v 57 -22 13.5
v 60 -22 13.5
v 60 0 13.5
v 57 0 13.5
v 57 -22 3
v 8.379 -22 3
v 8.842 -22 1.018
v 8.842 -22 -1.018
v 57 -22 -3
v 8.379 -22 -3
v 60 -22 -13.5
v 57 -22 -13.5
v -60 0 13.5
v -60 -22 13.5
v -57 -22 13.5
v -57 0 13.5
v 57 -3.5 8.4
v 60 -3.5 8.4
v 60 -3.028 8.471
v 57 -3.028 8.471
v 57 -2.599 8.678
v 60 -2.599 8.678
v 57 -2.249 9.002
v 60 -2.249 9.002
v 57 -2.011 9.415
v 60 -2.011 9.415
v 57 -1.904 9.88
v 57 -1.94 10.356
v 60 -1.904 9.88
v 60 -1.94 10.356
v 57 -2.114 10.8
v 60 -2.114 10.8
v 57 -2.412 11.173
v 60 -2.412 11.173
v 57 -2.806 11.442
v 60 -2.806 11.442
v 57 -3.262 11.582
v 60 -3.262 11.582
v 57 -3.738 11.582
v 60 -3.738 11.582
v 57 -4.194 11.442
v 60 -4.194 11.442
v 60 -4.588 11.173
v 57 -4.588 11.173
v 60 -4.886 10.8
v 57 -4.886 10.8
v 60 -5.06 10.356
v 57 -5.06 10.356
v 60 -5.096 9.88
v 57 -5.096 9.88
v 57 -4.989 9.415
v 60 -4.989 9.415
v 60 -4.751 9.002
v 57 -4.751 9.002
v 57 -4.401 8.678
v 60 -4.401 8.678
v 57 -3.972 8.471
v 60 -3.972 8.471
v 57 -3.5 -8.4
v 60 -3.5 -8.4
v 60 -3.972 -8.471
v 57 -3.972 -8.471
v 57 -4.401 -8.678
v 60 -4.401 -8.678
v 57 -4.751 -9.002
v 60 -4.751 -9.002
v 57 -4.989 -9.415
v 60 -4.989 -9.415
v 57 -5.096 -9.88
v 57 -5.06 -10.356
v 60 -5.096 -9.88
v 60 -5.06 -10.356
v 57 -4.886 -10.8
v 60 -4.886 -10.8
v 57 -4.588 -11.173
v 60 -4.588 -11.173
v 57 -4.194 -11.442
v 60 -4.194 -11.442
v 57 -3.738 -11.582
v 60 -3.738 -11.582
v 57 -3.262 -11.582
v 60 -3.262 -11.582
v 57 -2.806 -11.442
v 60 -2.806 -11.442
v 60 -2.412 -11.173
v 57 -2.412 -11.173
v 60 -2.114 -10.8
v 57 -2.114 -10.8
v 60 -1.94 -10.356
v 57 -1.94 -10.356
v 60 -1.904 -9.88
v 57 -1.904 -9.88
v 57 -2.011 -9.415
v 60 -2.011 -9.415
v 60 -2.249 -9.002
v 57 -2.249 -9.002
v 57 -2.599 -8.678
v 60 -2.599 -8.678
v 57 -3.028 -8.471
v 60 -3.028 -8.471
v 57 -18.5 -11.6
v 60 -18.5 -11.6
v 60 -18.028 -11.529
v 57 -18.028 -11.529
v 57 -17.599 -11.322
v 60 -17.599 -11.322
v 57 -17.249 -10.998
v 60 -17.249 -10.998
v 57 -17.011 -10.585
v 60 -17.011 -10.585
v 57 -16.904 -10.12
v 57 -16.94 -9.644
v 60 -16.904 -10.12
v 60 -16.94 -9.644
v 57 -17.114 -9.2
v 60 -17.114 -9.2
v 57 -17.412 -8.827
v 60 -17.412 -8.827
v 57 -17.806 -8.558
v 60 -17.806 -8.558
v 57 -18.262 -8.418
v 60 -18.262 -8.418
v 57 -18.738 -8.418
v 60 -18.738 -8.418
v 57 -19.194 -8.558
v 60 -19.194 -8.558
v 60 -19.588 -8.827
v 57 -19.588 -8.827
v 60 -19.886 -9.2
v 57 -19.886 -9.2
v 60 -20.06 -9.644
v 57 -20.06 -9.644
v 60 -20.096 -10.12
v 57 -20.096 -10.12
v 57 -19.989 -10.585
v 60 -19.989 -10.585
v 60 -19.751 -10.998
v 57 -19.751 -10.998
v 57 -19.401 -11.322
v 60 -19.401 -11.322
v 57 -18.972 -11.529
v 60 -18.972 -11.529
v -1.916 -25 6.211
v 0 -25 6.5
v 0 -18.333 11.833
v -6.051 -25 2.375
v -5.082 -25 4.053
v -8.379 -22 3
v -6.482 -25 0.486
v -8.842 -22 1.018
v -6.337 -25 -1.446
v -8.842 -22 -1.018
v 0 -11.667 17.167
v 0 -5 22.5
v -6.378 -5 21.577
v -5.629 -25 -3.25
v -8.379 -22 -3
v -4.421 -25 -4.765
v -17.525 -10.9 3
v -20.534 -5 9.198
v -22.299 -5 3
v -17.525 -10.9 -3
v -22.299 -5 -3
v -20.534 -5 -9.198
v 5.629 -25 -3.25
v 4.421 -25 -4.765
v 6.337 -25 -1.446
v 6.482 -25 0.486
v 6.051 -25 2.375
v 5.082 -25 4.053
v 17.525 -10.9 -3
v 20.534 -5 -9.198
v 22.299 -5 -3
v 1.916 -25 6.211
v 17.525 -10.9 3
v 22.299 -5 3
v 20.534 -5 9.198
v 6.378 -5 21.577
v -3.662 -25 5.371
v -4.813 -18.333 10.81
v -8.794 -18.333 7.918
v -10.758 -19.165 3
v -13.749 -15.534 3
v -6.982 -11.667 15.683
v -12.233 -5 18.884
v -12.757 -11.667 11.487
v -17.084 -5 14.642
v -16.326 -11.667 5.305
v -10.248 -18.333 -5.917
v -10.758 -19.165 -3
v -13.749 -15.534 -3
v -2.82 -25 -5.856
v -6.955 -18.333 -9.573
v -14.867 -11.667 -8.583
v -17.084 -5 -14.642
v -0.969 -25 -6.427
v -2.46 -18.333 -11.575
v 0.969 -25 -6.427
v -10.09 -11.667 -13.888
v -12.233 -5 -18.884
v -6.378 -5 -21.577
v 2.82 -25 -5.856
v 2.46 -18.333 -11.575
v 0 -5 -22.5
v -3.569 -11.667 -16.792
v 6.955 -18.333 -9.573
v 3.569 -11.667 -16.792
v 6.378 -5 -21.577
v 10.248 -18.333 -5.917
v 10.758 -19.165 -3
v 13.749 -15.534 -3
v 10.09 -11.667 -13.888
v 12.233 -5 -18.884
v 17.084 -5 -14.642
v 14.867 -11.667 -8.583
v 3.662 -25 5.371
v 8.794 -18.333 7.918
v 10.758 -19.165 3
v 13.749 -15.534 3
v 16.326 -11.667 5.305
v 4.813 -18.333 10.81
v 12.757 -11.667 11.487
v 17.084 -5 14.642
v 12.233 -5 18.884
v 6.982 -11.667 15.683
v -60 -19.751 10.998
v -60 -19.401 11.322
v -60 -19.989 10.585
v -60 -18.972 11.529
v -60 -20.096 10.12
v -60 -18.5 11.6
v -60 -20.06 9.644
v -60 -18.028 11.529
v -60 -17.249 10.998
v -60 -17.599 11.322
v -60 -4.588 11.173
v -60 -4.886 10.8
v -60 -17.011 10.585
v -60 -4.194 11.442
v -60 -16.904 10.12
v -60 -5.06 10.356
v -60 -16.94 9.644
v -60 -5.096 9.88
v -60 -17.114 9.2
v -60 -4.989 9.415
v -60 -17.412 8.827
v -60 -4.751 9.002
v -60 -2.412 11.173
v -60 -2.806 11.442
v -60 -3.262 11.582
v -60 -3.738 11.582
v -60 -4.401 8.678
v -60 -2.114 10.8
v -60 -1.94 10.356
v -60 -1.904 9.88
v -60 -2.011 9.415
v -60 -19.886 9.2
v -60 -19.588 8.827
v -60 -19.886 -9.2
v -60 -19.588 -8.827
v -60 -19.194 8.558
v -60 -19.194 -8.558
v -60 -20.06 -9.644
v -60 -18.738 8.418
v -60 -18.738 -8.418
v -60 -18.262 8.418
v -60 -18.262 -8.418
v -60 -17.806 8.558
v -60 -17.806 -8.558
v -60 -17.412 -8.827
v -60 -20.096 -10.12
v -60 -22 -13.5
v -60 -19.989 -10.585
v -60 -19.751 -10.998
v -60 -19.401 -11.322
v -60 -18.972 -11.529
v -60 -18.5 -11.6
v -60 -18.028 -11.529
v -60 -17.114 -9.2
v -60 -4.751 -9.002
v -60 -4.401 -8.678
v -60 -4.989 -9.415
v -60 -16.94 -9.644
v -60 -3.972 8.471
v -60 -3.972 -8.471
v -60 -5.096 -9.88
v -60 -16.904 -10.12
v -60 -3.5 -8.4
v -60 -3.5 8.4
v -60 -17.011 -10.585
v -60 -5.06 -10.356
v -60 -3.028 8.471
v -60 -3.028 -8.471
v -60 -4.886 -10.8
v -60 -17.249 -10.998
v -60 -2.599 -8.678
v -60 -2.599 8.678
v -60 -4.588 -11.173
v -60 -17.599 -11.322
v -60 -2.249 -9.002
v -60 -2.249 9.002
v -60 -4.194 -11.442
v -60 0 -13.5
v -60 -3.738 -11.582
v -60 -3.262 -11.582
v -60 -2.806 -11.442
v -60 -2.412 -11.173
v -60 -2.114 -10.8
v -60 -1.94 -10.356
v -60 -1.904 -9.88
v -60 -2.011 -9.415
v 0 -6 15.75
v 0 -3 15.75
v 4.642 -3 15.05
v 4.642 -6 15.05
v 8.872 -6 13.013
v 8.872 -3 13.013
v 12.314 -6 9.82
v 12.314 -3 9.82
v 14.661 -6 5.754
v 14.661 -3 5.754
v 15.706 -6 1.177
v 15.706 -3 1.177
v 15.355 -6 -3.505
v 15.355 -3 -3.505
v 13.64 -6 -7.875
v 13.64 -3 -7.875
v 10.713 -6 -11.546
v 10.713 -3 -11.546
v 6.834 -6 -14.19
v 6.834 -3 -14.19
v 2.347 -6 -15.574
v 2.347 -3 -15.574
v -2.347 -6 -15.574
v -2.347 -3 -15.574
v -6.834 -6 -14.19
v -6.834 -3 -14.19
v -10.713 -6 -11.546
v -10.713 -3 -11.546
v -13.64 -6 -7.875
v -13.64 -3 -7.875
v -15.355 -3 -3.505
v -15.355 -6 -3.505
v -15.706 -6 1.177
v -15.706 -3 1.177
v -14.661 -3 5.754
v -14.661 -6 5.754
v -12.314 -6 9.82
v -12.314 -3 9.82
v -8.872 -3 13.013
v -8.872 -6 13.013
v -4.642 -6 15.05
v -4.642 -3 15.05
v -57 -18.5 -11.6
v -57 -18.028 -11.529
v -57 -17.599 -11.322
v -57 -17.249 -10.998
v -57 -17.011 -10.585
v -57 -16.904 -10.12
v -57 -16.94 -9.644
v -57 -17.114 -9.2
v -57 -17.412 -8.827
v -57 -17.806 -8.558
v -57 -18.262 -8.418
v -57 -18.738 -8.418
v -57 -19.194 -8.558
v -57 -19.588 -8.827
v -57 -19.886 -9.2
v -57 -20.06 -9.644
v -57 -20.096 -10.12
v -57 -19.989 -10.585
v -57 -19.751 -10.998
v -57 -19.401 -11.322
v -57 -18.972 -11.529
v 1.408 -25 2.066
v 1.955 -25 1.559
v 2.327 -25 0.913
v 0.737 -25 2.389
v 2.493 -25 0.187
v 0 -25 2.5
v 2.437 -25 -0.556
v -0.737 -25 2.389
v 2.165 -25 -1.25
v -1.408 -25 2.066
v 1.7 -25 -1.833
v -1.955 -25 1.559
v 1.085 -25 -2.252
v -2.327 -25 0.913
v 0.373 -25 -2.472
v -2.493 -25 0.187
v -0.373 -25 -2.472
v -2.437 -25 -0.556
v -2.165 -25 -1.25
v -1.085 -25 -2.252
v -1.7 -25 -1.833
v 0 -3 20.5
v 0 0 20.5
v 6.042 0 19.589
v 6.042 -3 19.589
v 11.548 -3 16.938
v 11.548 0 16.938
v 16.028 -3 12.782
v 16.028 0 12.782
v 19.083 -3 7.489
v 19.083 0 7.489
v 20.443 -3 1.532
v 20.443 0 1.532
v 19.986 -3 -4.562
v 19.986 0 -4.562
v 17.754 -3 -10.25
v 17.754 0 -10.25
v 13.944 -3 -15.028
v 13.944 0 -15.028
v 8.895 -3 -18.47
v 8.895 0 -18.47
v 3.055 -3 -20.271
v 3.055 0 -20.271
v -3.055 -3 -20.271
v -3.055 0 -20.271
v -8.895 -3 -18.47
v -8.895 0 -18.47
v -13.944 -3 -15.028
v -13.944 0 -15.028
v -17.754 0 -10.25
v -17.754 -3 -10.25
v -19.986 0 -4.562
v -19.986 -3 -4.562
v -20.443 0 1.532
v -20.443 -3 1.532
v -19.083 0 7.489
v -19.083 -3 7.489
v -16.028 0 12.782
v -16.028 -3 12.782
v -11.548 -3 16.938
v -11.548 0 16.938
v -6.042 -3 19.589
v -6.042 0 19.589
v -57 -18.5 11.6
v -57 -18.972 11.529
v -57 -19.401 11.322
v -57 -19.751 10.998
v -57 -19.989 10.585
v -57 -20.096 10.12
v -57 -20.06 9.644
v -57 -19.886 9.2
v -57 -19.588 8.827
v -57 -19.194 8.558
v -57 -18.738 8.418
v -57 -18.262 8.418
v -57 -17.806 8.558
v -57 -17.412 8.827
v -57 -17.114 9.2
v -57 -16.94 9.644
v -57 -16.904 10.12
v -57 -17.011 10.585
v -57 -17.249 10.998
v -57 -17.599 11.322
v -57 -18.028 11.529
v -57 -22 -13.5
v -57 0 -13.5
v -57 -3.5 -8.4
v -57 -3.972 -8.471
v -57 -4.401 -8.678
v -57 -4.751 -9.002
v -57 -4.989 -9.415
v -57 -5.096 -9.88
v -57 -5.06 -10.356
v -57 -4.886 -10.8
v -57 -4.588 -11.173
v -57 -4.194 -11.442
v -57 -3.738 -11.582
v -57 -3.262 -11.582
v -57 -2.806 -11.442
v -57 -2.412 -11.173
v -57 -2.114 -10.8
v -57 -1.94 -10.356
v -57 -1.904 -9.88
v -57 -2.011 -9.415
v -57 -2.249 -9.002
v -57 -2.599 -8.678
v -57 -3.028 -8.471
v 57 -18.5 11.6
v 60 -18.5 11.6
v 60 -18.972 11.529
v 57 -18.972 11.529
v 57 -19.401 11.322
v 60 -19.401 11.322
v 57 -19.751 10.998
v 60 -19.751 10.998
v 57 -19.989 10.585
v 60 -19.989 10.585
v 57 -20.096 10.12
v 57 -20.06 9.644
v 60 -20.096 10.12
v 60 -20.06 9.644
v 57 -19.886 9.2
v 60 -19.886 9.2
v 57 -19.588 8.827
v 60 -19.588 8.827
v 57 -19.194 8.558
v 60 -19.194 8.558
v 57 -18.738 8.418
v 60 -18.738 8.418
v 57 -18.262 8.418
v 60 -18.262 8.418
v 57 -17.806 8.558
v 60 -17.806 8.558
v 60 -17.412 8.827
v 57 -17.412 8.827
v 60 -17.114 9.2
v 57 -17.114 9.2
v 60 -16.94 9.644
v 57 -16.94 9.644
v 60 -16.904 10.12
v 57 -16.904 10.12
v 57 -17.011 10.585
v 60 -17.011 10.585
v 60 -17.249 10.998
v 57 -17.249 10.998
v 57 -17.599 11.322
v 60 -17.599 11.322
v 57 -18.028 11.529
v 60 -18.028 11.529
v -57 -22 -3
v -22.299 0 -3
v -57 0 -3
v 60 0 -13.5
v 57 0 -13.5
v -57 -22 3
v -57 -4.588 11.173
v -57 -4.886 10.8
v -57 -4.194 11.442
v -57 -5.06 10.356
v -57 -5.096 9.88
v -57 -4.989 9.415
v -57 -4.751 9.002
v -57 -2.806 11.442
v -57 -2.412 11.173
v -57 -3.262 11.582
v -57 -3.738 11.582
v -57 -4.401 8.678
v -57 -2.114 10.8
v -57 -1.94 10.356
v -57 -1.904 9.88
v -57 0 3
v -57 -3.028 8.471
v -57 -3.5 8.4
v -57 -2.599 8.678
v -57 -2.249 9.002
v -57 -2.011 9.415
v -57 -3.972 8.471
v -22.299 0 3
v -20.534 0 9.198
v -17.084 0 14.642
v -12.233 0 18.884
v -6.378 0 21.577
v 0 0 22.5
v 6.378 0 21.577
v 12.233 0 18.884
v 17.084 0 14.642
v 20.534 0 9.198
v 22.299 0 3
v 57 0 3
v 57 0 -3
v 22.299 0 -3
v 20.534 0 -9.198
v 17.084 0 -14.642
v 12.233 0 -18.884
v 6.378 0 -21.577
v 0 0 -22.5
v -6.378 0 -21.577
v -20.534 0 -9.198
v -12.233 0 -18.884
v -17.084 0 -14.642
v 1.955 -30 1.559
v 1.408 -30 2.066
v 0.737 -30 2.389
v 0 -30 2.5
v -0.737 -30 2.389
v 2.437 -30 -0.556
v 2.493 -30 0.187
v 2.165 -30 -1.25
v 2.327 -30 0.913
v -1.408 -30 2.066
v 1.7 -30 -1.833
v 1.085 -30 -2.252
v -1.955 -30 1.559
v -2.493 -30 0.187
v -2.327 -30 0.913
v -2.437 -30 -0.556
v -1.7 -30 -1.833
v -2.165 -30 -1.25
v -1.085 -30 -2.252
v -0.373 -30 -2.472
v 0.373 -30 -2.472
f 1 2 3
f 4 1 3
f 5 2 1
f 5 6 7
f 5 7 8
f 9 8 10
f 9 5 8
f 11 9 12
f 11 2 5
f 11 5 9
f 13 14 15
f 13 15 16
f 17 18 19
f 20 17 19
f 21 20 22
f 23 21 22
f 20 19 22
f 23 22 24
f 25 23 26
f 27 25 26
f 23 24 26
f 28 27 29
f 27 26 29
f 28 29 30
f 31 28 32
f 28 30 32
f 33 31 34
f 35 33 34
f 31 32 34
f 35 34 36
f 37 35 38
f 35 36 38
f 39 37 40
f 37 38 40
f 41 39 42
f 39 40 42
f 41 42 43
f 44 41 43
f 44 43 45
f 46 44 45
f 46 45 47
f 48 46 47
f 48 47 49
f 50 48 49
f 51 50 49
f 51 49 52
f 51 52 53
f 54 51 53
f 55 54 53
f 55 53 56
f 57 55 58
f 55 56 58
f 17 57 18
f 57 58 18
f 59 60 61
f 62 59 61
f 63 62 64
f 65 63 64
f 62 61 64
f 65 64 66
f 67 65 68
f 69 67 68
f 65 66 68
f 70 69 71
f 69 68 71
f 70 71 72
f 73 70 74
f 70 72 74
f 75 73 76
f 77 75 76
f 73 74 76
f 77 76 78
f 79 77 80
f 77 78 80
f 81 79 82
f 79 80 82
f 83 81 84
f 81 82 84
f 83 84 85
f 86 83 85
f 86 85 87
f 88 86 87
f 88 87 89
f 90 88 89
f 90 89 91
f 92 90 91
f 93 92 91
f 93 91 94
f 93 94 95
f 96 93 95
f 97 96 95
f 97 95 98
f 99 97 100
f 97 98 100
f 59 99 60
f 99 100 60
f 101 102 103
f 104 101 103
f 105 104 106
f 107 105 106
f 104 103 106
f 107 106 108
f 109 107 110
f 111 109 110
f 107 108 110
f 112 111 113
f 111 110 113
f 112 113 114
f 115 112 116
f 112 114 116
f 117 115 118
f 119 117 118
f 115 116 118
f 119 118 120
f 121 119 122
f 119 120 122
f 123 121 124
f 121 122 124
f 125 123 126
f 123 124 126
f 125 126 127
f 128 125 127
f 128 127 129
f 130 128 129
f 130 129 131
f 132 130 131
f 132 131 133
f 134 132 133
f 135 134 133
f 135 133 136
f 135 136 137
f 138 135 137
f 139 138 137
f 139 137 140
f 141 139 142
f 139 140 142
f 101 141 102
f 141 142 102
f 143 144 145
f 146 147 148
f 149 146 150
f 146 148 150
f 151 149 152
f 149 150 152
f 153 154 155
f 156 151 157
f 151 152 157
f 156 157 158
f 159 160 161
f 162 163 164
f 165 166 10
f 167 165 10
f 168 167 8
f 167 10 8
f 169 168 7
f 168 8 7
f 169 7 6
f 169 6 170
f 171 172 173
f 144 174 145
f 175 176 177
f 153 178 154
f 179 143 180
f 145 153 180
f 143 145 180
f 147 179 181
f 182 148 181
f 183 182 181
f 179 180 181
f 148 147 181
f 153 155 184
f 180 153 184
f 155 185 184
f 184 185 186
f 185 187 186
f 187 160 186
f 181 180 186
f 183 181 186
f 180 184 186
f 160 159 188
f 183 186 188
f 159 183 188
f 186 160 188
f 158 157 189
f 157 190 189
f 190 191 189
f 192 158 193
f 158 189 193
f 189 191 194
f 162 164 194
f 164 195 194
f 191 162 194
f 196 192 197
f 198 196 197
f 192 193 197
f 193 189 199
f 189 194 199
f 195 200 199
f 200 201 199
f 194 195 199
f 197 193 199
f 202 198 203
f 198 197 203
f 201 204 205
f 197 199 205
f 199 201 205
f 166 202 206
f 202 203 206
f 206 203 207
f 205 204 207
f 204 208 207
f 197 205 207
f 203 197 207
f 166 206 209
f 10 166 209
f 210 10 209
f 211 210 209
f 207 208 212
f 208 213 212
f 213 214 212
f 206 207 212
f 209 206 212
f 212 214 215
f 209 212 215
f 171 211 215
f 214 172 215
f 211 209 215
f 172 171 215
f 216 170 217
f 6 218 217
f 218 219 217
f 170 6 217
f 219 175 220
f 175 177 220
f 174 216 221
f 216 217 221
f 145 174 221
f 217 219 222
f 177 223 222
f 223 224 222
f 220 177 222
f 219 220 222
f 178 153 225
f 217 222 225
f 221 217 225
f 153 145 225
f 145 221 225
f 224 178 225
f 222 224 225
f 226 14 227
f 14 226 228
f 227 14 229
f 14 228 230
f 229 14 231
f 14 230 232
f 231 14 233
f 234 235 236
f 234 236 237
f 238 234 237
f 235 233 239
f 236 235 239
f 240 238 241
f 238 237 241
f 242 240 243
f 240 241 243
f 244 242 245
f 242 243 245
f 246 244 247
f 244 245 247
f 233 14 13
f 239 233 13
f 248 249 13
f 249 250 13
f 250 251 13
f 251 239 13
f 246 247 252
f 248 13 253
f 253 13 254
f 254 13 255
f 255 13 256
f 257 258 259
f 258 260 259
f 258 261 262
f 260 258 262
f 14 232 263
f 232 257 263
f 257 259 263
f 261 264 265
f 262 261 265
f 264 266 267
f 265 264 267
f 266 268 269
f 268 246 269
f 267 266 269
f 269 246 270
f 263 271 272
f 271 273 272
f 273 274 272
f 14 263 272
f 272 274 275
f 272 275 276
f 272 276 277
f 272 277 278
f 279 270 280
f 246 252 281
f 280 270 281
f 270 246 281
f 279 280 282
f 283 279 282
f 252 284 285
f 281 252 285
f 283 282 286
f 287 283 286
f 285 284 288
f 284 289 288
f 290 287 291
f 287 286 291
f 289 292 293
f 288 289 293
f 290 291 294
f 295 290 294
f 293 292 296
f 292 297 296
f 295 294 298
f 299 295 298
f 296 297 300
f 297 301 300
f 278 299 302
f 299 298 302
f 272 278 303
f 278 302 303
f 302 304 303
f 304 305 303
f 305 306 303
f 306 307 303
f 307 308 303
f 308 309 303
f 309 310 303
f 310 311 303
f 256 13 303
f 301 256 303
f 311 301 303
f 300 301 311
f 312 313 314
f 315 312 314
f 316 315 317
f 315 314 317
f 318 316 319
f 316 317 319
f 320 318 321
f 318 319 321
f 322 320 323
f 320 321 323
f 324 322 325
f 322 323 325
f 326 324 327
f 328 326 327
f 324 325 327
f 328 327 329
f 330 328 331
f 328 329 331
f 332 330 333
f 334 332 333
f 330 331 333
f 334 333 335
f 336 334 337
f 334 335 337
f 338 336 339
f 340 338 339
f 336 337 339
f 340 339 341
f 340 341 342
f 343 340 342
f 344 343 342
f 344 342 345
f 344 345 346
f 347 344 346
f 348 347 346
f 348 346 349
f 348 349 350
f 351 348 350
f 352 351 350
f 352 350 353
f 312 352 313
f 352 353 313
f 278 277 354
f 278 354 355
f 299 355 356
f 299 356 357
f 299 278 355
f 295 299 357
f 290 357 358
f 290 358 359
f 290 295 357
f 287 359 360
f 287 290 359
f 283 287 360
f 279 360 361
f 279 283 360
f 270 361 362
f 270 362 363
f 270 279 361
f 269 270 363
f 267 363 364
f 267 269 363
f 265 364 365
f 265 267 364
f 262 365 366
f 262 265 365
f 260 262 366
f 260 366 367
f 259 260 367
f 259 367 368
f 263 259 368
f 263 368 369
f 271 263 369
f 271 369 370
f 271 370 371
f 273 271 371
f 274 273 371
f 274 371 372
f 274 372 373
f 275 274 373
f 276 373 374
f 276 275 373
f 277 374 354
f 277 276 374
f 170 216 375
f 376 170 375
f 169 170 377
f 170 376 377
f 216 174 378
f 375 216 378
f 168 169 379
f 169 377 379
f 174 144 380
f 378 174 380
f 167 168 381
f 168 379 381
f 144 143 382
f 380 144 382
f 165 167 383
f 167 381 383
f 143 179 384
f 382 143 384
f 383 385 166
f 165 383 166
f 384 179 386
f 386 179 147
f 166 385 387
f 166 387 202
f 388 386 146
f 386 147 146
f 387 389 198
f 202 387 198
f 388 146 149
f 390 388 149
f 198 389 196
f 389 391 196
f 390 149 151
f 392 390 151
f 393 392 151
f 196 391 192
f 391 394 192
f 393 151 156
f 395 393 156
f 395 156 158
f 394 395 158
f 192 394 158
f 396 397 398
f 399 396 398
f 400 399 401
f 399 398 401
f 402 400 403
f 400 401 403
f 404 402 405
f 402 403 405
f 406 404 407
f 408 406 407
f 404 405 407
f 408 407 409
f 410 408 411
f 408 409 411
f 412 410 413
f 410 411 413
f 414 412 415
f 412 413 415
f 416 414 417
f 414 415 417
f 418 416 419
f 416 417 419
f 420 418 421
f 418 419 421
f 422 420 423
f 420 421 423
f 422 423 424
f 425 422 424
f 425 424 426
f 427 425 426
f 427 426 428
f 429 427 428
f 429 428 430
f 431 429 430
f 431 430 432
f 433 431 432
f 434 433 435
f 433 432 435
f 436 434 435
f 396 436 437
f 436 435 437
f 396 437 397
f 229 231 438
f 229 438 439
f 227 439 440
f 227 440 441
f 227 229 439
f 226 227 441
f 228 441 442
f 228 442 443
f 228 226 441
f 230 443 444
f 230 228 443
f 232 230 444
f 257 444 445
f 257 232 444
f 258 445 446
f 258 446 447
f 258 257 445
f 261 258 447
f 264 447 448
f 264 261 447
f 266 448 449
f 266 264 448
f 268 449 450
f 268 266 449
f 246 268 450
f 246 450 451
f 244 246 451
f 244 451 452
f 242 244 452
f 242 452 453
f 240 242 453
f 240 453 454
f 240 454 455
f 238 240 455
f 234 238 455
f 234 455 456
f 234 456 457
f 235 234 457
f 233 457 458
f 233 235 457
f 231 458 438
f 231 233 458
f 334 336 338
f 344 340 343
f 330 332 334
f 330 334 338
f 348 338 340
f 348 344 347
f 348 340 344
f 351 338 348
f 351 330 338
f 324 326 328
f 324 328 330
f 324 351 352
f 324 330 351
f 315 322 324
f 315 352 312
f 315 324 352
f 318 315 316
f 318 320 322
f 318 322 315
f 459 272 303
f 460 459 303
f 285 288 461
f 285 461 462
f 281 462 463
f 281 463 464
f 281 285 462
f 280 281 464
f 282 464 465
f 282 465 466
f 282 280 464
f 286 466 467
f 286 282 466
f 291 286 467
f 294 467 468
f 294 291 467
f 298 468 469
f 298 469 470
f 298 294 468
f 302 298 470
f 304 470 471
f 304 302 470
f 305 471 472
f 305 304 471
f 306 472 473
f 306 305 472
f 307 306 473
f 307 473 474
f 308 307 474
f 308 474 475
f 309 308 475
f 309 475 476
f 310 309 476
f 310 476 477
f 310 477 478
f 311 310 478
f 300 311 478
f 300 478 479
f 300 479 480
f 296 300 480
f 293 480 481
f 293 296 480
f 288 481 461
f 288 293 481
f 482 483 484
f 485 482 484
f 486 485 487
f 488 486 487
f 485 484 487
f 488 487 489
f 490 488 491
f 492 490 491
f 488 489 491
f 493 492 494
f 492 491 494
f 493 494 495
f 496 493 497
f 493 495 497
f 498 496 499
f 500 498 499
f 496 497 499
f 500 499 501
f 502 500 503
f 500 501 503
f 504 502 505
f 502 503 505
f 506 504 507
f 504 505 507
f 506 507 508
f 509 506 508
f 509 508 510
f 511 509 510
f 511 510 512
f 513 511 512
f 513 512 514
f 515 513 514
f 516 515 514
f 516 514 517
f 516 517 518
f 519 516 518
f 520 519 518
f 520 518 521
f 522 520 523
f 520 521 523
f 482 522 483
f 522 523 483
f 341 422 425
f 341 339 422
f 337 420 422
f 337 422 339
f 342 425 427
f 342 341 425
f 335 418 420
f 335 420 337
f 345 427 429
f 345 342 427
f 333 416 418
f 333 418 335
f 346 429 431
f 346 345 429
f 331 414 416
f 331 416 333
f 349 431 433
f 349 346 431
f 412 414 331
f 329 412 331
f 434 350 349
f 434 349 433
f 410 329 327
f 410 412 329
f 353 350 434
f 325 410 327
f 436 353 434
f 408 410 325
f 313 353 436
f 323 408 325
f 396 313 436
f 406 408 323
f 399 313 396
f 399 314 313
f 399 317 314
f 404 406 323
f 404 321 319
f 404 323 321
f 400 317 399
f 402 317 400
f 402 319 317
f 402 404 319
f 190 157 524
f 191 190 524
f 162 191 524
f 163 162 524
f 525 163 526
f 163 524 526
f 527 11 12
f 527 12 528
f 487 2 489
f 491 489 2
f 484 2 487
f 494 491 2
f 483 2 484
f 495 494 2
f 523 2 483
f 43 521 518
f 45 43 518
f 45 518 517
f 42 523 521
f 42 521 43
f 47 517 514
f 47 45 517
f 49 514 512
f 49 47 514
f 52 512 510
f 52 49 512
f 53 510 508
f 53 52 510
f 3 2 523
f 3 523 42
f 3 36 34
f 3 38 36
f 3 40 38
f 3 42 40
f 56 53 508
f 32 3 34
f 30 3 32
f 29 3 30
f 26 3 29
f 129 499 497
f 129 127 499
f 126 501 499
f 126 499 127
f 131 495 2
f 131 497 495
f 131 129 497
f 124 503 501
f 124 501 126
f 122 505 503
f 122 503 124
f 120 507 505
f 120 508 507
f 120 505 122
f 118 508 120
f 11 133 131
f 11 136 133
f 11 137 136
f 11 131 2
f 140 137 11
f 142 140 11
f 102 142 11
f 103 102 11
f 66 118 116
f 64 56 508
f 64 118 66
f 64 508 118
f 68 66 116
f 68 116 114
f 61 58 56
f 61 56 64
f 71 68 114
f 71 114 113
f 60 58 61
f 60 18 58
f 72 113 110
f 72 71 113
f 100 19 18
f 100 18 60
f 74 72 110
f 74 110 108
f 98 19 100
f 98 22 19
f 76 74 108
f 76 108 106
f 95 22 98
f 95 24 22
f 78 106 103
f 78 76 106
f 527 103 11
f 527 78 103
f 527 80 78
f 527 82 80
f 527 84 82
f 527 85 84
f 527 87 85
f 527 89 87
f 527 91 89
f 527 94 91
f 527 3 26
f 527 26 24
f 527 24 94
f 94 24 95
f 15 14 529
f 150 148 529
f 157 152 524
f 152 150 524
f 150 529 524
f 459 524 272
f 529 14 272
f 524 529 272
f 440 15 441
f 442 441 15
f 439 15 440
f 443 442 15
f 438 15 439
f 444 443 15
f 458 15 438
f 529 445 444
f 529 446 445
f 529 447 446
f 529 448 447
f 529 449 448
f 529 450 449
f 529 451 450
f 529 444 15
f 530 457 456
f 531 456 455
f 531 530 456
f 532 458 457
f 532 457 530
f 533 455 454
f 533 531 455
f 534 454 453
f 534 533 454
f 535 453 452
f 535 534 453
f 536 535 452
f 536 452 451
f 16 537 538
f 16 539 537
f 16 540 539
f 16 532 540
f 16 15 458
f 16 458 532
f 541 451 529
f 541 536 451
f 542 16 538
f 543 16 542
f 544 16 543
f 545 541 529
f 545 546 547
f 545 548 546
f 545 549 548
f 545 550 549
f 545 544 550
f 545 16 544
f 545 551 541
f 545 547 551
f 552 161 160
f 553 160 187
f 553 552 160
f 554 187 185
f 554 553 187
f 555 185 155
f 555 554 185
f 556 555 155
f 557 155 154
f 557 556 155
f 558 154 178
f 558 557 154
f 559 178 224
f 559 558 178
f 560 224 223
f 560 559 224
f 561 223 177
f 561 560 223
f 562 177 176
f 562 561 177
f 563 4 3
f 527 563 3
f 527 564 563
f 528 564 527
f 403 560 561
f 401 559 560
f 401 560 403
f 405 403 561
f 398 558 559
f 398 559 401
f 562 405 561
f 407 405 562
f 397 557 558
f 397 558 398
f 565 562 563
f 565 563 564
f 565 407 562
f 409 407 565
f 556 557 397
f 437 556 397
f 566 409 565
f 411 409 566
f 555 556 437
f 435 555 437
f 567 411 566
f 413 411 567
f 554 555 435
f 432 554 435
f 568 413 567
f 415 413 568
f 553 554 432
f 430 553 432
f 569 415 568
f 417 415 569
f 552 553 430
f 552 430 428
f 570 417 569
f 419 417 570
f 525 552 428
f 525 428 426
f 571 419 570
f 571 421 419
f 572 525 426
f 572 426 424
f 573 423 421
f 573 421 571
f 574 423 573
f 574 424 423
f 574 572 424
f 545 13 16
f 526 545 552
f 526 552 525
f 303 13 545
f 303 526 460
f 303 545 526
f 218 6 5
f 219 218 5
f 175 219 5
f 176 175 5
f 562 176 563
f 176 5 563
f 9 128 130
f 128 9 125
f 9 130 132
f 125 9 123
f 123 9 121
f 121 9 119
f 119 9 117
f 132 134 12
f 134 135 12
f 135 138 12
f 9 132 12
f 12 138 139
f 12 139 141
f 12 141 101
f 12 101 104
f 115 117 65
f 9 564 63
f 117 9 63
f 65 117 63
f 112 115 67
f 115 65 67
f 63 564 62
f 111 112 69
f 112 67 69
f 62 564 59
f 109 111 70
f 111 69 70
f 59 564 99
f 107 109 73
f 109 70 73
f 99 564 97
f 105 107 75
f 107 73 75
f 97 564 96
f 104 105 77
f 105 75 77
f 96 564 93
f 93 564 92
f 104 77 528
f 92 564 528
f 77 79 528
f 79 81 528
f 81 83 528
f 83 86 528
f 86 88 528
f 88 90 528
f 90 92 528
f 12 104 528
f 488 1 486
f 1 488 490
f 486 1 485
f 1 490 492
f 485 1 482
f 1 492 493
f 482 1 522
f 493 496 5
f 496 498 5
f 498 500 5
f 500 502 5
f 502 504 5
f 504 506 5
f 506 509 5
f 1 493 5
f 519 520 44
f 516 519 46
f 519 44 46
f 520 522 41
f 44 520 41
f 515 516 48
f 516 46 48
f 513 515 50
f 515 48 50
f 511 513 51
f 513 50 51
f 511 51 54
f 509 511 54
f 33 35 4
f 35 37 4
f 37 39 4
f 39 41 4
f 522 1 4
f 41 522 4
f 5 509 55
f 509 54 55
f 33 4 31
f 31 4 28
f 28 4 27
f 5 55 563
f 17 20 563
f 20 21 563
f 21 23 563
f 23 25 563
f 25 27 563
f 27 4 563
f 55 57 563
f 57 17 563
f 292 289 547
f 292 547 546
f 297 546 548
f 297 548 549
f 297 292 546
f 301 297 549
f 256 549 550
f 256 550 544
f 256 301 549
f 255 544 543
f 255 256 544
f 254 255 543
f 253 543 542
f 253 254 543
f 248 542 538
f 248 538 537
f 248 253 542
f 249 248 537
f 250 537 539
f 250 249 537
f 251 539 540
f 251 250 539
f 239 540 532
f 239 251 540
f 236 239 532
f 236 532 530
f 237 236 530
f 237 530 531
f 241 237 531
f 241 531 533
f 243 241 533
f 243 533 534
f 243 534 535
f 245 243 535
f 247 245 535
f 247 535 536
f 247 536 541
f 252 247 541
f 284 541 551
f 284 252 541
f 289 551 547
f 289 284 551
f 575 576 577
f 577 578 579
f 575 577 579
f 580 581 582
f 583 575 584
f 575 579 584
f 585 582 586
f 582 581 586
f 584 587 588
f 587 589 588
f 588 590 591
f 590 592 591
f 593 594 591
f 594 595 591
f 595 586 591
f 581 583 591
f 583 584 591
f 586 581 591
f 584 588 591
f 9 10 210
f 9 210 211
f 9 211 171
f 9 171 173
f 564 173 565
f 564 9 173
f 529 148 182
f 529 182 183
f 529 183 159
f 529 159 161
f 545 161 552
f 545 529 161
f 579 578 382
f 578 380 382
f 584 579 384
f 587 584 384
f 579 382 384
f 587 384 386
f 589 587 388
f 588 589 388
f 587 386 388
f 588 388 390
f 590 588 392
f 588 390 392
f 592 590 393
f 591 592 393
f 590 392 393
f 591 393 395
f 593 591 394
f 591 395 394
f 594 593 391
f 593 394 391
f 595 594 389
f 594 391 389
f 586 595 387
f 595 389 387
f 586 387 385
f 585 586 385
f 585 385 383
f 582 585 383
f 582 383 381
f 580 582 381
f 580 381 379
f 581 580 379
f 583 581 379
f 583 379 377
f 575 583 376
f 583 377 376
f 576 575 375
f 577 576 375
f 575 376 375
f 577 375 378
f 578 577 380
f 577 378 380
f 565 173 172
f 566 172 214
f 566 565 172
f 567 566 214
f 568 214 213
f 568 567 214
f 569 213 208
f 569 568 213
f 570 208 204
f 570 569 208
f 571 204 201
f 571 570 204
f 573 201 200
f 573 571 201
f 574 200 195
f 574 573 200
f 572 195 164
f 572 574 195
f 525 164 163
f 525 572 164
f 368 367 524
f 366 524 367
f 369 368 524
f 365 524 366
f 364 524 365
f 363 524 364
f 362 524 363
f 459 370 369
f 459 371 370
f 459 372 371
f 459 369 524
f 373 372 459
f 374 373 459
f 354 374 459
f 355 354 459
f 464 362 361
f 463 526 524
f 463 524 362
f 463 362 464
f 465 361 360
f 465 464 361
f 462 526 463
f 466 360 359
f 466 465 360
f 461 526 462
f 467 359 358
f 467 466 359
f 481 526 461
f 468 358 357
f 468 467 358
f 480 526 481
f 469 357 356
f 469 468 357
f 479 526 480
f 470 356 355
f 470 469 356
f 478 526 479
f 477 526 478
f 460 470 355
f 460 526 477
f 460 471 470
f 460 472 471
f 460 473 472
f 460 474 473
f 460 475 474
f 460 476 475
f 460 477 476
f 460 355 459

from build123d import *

# Parameters (mm, degrees)
SKETCH1_R    = 22.5
BASE_DEPTH   = 50
SKETCH3_R    = 20.5
INSET_DEPTH  = 3
SKETCH11_R   = 15.75
INSET2_DEPTH = 3
PAD_START    = 60
SKETCH4_W    = 27
SKETCH4_H    = 22
SKETCH4_R    = 1.6
PAD_DEPTH    = 3
RIB_REACH    = 89.901
SKETCH5_W    = 6
SKETCH5_H    = 22
PAD2_START   = -60
SKETCH4_2_W  = 27
SKETCH4_2_H  = 22
SKETCH4_2_R  = 1.6
PAD2_DEPTH   = 3
RIB2_REACH   = 124.863
SKETCH8_W    = 6
SKETCH8_H    = 22


with BuildPart() as part:
    # Sketch1 → Base (new body)
    with BuildSketch(Plane(origin=(0, 0, 0), x_dir=(1, 0, 0), z_dir=(0, 1, 0))):
        Circle(SKETCH1_R)
    extrude(amount=-BASE_DEPTH)

    # Sketch2 → Cone (revolve, cut)
    with BuildSketch(Plane(origin=(0, 0, 0), x_dir=(0, 0, -1), z_dir=(1, 0, 0))):
        Polygon((33.595146004, -5), (33.595146004, -56.971439611), (0, -56.971439611), (0, -30), (2.5, -30), (2.5, -25), (6.5, -25), (22.5, -5), align=None)
    revolve(axis=Axis((0, 0, 0), (0, -1, 0)), mode=Mode.SUBTRACT)

    # Sketch3 → Inset (cut)
    with BuildSketch(Plane(origin=(0, 0, 0), x_dir=(1, 0, 0), z_dir=(0, 1, 0))):
        Circle(SKETCH3_R)
    extrude(amount=-INSET_DEPTH, mode=Mode.SUBTRACT)

    # Sketch11 → Inset2 (cut)
    with BuildSketch(Plane(origin=(0, -3, 0), x_dir=(1, 0, 0), z_dir=(0, 1, 0))):
        Circle(SKETCH11_R)
    extrude(amount=-INSET2_DEPTH, mode=Mode.SUBTRACT)

    # Sketch5 → Rib (add, up to next)
    with BuildSketch(Plane.ZY.offset(-57), mode=Mode.PRIVATE) as rib_sk1:
        with Locations((0, -11)):
            Rectangle(SKETCH5_W, SKETCH5_H)
    rib_tool1 = extrude(rib_sk1.sketch, amount=RIB_REACH, mode=Mode.PRIVATE) - part.part


with BuildPart() as body_2:
    # Sketch4 → Pad (new body)
    with BuildSketch(Plane(origin=(0, 0, 0), x_dir=(0, 0, -1), z_dir=(1, 0, 0)).offset(PAD_START)):
        with Locations((0, -11)):
            Rectangle(SKETCH4_W, SKETCH4_H)
        with Locations((-10, -3.5)):
            Circle(SKETCH4_R, mode=Mode.SUBTRACT)
        with Locations((-10, -18.5)):
            Circle(SKETCH4_R, mode=Mode.SUBTRACT)
        with Locations((10, -18.5)):
            Circle(SKETCH4_R, mode=Mode.SUBTRACT)
        with Locations((10, -3.5)):
            Circle(SKETCH4_R, mode=Mode.SUBTRACT)
    extrude(amount=-PAD_DEPTH)


with BuildPart() as part_1:
    add(part.part)

    add(body_2.part)  # Rib merges body 2
    add(rib_tool1.solids().sort_by_distance((57, -11, 0))[0])

    # Sketch8 → Rib2 (add, up to next)
    with BuildSketch(Plane(origin=(-57, 0, 0), x_dir=(0, 0, -1), z_dir=(1, 0, 0)), mode=Mode.PRIVATE) as rib2_sk1:
        with Locations((0, -11)):
            Rectangle(SKETCH8_W, SKETCH8_H)
    rib2_tool1 = extrude(rib2_sk1.sketch, amount=RIB2_REACH, mode=Mode.PRIVATE) - part_1.part


with BuildPart() as body_2_2:
    # Sketch4<2> → Pad2 (new body)
    with BuildSketch(Plane(origin=(0, 0, 0), x_dir=(0, 0, -1), z_dir=(1, 0, 0)).offset(PAD2_START)):
        with Locations((0, -11)):
            Rectangle(SKETCH4_2_W, SKETCH4_2_H)
        with Locations((-10, -3.5)):
            Circle(SKETCH4_2_R, mode=Mode.SUBTRACT)
        with Locations((-10, -18.5)):
            Circle(SKETCH4_2_R, mode=Mode.SUBTRACT)
        with Locations((10, -18.5)):
            Circle(SKETCH4_2_R, mode=Mode.SUBTRACT)
        with Locations((10, -3.5)):
            Circle(SKETCH4_2_R, mode=Mode.SUBTRACT)
    extrude(amount=PAD2_DEPTH)


with BuildPart() as part_2:
    add(part_1.part)

    add(body_2_2.part)  # Rib2 merges body 2 2
    add(rib2_tool1.solids().sort_by_distance((-57, -11, 0))[0])


solid = part_2.part
